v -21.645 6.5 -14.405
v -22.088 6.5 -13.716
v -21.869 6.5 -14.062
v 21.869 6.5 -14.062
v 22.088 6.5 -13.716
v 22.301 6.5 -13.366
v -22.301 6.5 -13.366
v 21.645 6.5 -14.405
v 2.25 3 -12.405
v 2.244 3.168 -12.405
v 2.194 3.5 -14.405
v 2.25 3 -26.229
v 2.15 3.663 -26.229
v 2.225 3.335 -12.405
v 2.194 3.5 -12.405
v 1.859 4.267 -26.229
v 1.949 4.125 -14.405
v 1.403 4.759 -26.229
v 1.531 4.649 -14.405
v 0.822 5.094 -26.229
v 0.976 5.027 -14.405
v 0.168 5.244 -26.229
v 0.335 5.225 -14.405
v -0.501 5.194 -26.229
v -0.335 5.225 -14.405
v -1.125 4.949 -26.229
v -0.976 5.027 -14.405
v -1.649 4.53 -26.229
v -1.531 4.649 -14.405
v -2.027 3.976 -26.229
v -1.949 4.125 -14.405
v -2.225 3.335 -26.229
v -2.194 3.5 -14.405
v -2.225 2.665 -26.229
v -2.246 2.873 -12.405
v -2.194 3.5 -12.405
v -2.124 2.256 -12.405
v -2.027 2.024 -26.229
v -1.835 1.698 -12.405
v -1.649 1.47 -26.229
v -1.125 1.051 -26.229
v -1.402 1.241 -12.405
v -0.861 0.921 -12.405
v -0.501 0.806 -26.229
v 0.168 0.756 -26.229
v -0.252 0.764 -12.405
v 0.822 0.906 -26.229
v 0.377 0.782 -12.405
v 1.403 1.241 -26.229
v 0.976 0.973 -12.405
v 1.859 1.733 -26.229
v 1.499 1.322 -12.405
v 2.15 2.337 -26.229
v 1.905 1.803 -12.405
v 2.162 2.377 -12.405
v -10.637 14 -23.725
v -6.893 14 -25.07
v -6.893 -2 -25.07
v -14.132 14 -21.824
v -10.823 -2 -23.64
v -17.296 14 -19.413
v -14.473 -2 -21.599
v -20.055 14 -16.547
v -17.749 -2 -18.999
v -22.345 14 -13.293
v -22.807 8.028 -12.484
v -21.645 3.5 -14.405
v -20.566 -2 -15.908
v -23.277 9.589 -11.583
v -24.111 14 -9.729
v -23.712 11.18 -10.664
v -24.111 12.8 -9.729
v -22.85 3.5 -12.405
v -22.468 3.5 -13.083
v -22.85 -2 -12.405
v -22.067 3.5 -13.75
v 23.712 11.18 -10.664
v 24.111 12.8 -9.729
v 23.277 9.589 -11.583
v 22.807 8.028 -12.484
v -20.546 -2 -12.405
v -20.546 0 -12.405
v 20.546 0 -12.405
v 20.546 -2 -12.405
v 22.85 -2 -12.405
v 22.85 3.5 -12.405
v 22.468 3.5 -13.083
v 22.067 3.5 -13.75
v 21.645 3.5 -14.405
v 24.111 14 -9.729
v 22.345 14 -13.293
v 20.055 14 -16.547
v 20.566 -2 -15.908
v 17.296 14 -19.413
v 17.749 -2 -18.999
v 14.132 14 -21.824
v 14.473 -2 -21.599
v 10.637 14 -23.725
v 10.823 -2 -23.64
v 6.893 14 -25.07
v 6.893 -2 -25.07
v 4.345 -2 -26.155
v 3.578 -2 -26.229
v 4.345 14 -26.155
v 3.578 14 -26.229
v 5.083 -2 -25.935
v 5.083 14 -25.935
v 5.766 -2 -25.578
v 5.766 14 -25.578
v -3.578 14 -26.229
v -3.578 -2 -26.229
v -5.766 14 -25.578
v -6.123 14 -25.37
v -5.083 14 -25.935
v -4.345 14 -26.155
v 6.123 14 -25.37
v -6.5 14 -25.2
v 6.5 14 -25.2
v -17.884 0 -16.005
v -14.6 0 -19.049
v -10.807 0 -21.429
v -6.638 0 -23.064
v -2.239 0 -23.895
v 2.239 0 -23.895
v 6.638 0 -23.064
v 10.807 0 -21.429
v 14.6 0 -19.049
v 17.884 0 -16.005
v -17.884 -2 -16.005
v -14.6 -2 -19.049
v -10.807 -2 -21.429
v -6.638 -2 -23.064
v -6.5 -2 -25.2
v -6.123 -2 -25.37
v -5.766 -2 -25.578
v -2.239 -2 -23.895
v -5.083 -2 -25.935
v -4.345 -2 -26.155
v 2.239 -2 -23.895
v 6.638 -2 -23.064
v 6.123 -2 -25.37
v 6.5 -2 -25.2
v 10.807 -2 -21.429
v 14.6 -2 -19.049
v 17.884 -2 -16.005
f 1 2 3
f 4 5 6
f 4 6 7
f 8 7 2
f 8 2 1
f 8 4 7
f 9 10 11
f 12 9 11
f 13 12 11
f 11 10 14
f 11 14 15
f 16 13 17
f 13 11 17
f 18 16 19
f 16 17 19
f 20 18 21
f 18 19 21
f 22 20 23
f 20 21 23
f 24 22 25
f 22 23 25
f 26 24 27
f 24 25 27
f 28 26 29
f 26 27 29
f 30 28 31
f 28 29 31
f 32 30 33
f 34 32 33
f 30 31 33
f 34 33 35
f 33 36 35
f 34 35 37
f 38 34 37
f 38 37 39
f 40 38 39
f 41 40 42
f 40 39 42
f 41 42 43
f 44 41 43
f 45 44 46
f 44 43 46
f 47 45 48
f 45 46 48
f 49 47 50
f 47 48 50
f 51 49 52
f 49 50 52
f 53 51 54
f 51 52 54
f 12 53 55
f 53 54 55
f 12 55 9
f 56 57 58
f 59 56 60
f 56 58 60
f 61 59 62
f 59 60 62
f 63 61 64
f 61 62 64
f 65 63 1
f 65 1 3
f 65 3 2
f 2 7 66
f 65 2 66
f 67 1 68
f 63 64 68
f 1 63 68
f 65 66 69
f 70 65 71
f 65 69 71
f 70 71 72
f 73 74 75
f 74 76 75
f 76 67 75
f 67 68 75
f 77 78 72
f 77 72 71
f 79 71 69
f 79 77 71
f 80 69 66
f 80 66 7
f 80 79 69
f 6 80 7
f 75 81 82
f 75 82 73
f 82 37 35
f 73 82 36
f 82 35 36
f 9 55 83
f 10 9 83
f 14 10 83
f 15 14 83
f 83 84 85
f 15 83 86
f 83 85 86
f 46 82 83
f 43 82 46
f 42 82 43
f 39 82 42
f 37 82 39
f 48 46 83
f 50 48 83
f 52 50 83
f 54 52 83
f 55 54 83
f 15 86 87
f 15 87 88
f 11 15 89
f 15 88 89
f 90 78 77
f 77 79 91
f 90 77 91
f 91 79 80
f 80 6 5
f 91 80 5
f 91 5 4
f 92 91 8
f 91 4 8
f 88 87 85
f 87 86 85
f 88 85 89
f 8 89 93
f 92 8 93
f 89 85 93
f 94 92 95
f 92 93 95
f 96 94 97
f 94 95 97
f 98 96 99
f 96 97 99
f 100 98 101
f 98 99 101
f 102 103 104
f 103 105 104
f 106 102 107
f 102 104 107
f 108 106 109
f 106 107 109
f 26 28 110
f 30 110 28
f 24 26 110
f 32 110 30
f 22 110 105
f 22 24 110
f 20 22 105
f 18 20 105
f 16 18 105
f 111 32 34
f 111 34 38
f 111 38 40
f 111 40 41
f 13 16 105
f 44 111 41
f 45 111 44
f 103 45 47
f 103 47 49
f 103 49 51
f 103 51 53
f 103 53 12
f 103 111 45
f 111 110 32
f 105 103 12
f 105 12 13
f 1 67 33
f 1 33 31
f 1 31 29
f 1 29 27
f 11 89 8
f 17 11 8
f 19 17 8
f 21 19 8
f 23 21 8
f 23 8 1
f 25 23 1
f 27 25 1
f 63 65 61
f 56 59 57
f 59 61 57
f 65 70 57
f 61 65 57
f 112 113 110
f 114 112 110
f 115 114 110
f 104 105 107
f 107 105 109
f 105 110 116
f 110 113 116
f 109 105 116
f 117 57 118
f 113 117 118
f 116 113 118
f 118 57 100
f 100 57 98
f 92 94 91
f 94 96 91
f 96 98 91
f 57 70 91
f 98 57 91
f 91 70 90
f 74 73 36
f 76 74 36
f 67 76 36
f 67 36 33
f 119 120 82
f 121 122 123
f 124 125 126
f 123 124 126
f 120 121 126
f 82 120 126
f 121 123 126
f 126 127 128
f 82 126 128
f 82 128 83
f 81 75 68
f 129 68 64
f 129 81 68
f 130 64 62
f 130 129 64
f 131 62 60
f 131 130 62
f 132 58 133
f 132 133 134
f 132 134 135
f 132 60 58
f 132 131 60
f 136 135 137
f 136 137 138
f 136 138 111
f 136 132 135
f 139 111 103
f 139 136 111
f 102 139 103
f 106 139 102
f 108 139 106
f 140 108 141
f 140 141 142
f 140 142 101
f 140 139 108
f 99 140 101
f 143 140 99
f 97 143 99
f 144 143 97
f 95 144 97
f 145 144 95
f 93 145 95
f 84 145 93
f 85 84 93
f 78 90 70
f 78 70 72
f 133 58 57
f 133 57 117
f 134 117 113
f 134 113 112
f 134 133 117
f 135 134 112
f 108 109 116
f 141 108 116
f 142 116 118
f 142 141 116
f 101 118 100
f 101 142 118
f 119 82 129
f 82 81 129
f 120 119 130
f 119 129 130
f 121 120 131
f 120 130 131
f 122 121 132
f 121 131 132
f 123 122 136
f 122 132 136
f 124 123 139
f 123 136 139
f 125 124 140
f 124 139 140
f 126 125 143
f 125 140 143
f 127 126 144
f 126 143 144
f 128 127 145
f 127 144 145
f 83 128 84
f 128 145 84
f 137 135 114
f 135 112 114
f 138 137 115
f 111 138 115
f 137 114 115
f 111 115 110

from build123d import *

# Parameters (mm, degrees)
SKETCH_1_R                  = 26
EXTRUDE_1_DEPTH             = 14
CUT_EXTRUDE_1_DEPTH         = 30
HOLE_WIZARD_M32_D           = 3.4
HOLE_WIZARD_M32_CBORE_D     = 6.6
HOLE_WIZARD_M32_CBORE_DEPTH = 3
EXTRUDE_START               = 2
SKETCH_12_R                 = 26
SKETCH_12_R_2               = 24
EXTRUDE_2_DEPTH             = 2
CUT_EXTRUDE_START           = -8
CUT_EXTRUDE_4_DEPTH         = 8
FILLET_2_R                  = 1
SKETCH_18_R                 = 6
CUT_EXTRUDE_5_DEPTH         = 3
CUT_EXTRUDE_START_2         = -10
CUT_EXTRUDE_6_DEPTH         = 10
M4X0_71_D                   = 3.3
M4X0_71_DEPTH               = 11.5
M4X0_71_TIP                 = 0.991420021
SKETCH_20_W                 = 50.531548996
SKETCH_20_H                 = 7
CUT_EXTRUDE_7_DEPTH         = 2
SKETCH_24_W                 = 22.63069338
SKETCH_24_H                 = 1
EXTRUDE_3_DEPTH             = 2
SKETCH_25_W                 = 27.749072331
SKETCH_25_H                 = 11.312162615
CUT_EXTRUDE_8_DEPTH         = 60.799665638
SKETCH_26_W                 = 2
SKETCH_26_H                 = 3
CUT_EXTRUDE_10_DEPTH        = 59.164737265
EXTRUDE_START_2             = -16
EXTRUDE_5_DEPTH             = 16
FILLET_3_R                  = 4
FILLET_4_R                  = 4
HOLE_WIZARD_M41_D           = 4.5


with BuildPart() as part:
    # Эскиз1 → Бобышка-Вытянуть1 (new body)
    with BuildSketch(Plane(origin=(0, 0, 0), x_dir=(1, 0, 0), z_dir=(0, 1, 0))):
        with Locations(Location((0, 0, 0), (0, 0, 270))):
            Circle(SKETCH_1_R)
    extrude(amount=EXTRUDE_1_DEPTH)

    # Эскиз2 → Вырез-Вытянуть1 (cut, symmetric)
    with BuildSketch(Plane(origin=(0, 0, 0), x_dir=(0, 0, -1), z_dir=(1, 0, 0))):
        Polygon((13.654700538, 6), (-13.654700538, 6), (-9.728718708, 12.8), (-9.728718708, 14), (9.728718708, 14), (9.728718708, 12.8), align=None)
    extrude(amount=CUT_EXTRUDE_1_DEPTH, both=True, mode=Mode.SUBTRACT)

    # Цековка для винта с внутренним шестигранником M32 (through all)
    with Locations(Plane(origin=(0, 6, 0), x_dir=(1, 0, 0), z_dir=(0, 1, 0))):
        with Locations((-12.5, 0), (12.5, 0), (-6, 0), (6, 0)):
            CounterBoreHole(HOLE_WIZARD_M32_D / 2, HOLE_WIZARD_M32_CBORE_D / 2, HOLE_WIZARD_M32_CBORE_DEPTH)

    # Эскиз12 → Бобышка-Вытянуть2 (add)
    with BuildSketch(Plane.XZ.offset(EXTRUDE_START)):
        with Locations(Location((0, 0, 0), (0, 0, 270))):
            Circle(SKETCH_12_R)
        with Locations(Location((0, 0, 0), (0, 0, 270))):
            Circle(SKETCH_12_R_2, mode=Mode.SUBTRACT)
    extrude(amount=-EXTRUDE_2_DEPTH)

    # Эскиз17 → Вырез-Вытянуть4 (cut)
    with BuildSketch(Plane(origin=(0, 14, 0), x_dir=(1, 0, 0), z_dir=(0, 1, 0)).offset(CUT_EXTRUDE_START)):
        with BuildLine():
            Line((-24.111242861, -9.728718708), (24.111242861, -9.728718708))
            ThreePointArc((24.111242861, -9.728718708), (0, -26), (-24.111242861, -9.728718708))
        make_face()
    extrude(amount=CUT_EXTRUDE_4_DEPTH, mode=Mode.SUBTRACT)

    # Скругление2
    fillet_2_edges = [part.edges().sort_by_distance(p)[0] for p in [
        (9.25, 4.5, -0.572276157),
        (9.25, 4.5, 0.572276157),
        (-9.25, 4.5, 0.572276157),
        (-9.25, 4.5, -0.572276157),
    ]]
    fillet(fillet_2_edges, radius=FILLET_2_R)

    # Эскиз18 → Вырез-Вытянуть5 (cut)
    with BuildSketch(Plane.XZ):
        Circle(SKETCH_18_R)
    extrude(amount=-CUT_EXTRUDE_5_DEPTH, mode=Mode.SUBTRACT)

    # Эскиз19 → Вырез-Вытянуть6 (cut)
    with BuildSketch(Plane(origin=(0, 6, 0), x_dir=(1, 0, 0), z_dir=(0, 1, 0)).offset(CUT_EXTRUDE_START_2)):
        with BuildLine():
            Line((-22.313739765, -13.345299462), (22.313739765, -13.345299462))
            ThreePointArc((22.313739765, -13.345299462), (0, -26), (-22.313739765, -13.345299462))
        make_face()
    extrude(amount=CUT_EXTRUDE_6_DEPTH, mode=Mode.SUBTRACT)

    # Отверстие обработанное метчиком M4x0.71
    with Locations(Plane.XY.offset(13.345299462)):
        with Locations((0, 3)):
            Hole(M4X0_71_D / 2, depth=M4X0_71_DEPTH)
            with Locations((0, 0, -(M4X0_71_DEPTH + M4X0_71_TIP / 2))):  # 118° drill point
                Cone(0, M4X0_71_D / 2, M4X0_71_TIP, mode=Mode.SUBTRACT)

    # Эскиз20 → Вырез-Вытянуть7 (cut)
    with BuildSketch(Plane.XY.offset(13.345299462)):
        with Locations((0, 1.5)):
            Rectangle(SKETCH_20_W, SKETCH_20_H)
    extrude(amount=-CUT_EXTRUDE_7_DEPTH, mode=Mode.SUBTRACT)

    # Эскиз24 → Бобышка-Вытянуть3 (add)
    with BuildSketch(Plane.XY.offset(11.345299462)):
        with Locations((0, 0.5)):
            Rectangle(SKETCH_24_W, SKETCH_24_H)
    extrude(amount=EXTRUDE_3_DEPTH)

    # Эскиз25 → Вырез-Вытянуть8 (cut, through all)
    with BuildSketch(Plane(origin=(26, 0, 0), x_dir=(0, 0, -1), z_dir=(1, 0, 0))):
        with Locations((-1.469835628, 0.343918692)):
            Rectangle(SKETCH_25_W, SKETCH_25_H)
    extrude(amount=-CUT_EXTRUDE_8_DEPTH, mode=Mode.SUBTRACT)

    # Эскиз26 → Вырез-Вытянуть10 (cut, through all)
    with BuildSketch(Plane(origin=(26, 0, 0), x_dir=(0, 0, -1), z_dir=(1, 0, 0))):
        with Locations((13.404700538, 5)):
            Rectangle(SKETCH_26_W, SKETCH_26_H)
    extrude(amount=-CUT_EXTRUDE_10_DEPTH, mode=Mode.SUBTRACT)

    # Эскиз27 → Бобышка-Вытянуть5 (add)
    with BuildSketch(Plane(origin=(0, 14, 0), x_dir=(1, 0, 0), z_dir=(0, 1, 0)).offset(EXTRUDE_START_2)):
        with BuildLine():
            Line((-5, 26.228718708), (5, 26.228718708))
            Line((5, 26.228718708), (5, 25.514701644))
            ThreePointArc((5, 25.514701644), (0, 26), (-5, 25.514701644))
            Line((-5, 25.514701644), (-5, 26.228718708))
        make_face()
    extrude(amount=EXTRUDE_5_DEPTH)

    # Скругление3
    # the kernel refuses this fillet: 4 mm, written as the material it adds along each edge
    with BuildSketch(Plane(origin=(5, -2, -25.514701644), x_dir=(0.9734574738252592, 0, 0.22886796773193235), z_dir=(0, 1, 0))) as fillet_3_piece_1:
        with BuildLine():
            CenterArc((2.09399194, 3.997202592), FILLET_3_R, 235.642702264, 32.214353504)
            Line((-0.163415634, 0.695065247), (-0.208563786, 0.6290225))
            ThreePointArc((-0.208563786, 0.6290225), (-0.159584415, 0.329223186), (-0.077876598, -0.018309437))
            Line((-0.077876598, -0.018309437), (0.002991417, -0.079944052))
            ThreePointArc((0.002991417, -0.079944052), (0.972210544, -0.061816847), (1.94142967, -0.079944052))
            Line((1.94142967, -0.079944052), (1.944421087, 0))
        make_face()
    extrude(amount=16)
    with BuildSketch(Plane(origin=(-5, -2, -25.514701644), x_dir=(-0.9734574738252595, 0, 0.2288679677319309), z_dir=(0, 1, 0))) as fillet_3_piece_2:
        with BuildLine():
            CenterArc((2.09399194, -3.997202592), FILLET_3_R, 92.142944232, 32.214353504)
            Line((-0.163415634, -0.695065247), (-0.208563786, -0.6290225))
            ThreePointArc((-0.208563786, -0.6290225), (-0.159584415, -0.329223186), (-0.077876598, 0.018309437))
            Line((-0.077876598, 0.018309437), (0.002991417, 0.079944052))
            ThreePointArc((0.002991417, 0.079944052), (0.972210544, 0.061816847), (1.94142967, 0.079944052))
            Line((1.94142967, 0.079944052), (1.944421087, 0))
        make_face()
    extrude(amount=16)

    # Скругление4
    fillet_4_edges = [part.edges().sort_by_distance(p)[0] for p in [
        (5, 6, -26.228718708),
        (-5, 6, -26.228718708),
    ]]
    fillet(fillet_4_edges, radius=FILLET_4_R)

    # Отверстие с зазором M41 (through all)
    with Locations(Plane(origin=(0, 0, -26.228718708), x_dir=(-1, 0, 0), z_dir=(0, 0, -1))):
        with Locations((0, 3)):
            Hole(HOLE_WIZARD_M41_D / 2)


solid = part.part
